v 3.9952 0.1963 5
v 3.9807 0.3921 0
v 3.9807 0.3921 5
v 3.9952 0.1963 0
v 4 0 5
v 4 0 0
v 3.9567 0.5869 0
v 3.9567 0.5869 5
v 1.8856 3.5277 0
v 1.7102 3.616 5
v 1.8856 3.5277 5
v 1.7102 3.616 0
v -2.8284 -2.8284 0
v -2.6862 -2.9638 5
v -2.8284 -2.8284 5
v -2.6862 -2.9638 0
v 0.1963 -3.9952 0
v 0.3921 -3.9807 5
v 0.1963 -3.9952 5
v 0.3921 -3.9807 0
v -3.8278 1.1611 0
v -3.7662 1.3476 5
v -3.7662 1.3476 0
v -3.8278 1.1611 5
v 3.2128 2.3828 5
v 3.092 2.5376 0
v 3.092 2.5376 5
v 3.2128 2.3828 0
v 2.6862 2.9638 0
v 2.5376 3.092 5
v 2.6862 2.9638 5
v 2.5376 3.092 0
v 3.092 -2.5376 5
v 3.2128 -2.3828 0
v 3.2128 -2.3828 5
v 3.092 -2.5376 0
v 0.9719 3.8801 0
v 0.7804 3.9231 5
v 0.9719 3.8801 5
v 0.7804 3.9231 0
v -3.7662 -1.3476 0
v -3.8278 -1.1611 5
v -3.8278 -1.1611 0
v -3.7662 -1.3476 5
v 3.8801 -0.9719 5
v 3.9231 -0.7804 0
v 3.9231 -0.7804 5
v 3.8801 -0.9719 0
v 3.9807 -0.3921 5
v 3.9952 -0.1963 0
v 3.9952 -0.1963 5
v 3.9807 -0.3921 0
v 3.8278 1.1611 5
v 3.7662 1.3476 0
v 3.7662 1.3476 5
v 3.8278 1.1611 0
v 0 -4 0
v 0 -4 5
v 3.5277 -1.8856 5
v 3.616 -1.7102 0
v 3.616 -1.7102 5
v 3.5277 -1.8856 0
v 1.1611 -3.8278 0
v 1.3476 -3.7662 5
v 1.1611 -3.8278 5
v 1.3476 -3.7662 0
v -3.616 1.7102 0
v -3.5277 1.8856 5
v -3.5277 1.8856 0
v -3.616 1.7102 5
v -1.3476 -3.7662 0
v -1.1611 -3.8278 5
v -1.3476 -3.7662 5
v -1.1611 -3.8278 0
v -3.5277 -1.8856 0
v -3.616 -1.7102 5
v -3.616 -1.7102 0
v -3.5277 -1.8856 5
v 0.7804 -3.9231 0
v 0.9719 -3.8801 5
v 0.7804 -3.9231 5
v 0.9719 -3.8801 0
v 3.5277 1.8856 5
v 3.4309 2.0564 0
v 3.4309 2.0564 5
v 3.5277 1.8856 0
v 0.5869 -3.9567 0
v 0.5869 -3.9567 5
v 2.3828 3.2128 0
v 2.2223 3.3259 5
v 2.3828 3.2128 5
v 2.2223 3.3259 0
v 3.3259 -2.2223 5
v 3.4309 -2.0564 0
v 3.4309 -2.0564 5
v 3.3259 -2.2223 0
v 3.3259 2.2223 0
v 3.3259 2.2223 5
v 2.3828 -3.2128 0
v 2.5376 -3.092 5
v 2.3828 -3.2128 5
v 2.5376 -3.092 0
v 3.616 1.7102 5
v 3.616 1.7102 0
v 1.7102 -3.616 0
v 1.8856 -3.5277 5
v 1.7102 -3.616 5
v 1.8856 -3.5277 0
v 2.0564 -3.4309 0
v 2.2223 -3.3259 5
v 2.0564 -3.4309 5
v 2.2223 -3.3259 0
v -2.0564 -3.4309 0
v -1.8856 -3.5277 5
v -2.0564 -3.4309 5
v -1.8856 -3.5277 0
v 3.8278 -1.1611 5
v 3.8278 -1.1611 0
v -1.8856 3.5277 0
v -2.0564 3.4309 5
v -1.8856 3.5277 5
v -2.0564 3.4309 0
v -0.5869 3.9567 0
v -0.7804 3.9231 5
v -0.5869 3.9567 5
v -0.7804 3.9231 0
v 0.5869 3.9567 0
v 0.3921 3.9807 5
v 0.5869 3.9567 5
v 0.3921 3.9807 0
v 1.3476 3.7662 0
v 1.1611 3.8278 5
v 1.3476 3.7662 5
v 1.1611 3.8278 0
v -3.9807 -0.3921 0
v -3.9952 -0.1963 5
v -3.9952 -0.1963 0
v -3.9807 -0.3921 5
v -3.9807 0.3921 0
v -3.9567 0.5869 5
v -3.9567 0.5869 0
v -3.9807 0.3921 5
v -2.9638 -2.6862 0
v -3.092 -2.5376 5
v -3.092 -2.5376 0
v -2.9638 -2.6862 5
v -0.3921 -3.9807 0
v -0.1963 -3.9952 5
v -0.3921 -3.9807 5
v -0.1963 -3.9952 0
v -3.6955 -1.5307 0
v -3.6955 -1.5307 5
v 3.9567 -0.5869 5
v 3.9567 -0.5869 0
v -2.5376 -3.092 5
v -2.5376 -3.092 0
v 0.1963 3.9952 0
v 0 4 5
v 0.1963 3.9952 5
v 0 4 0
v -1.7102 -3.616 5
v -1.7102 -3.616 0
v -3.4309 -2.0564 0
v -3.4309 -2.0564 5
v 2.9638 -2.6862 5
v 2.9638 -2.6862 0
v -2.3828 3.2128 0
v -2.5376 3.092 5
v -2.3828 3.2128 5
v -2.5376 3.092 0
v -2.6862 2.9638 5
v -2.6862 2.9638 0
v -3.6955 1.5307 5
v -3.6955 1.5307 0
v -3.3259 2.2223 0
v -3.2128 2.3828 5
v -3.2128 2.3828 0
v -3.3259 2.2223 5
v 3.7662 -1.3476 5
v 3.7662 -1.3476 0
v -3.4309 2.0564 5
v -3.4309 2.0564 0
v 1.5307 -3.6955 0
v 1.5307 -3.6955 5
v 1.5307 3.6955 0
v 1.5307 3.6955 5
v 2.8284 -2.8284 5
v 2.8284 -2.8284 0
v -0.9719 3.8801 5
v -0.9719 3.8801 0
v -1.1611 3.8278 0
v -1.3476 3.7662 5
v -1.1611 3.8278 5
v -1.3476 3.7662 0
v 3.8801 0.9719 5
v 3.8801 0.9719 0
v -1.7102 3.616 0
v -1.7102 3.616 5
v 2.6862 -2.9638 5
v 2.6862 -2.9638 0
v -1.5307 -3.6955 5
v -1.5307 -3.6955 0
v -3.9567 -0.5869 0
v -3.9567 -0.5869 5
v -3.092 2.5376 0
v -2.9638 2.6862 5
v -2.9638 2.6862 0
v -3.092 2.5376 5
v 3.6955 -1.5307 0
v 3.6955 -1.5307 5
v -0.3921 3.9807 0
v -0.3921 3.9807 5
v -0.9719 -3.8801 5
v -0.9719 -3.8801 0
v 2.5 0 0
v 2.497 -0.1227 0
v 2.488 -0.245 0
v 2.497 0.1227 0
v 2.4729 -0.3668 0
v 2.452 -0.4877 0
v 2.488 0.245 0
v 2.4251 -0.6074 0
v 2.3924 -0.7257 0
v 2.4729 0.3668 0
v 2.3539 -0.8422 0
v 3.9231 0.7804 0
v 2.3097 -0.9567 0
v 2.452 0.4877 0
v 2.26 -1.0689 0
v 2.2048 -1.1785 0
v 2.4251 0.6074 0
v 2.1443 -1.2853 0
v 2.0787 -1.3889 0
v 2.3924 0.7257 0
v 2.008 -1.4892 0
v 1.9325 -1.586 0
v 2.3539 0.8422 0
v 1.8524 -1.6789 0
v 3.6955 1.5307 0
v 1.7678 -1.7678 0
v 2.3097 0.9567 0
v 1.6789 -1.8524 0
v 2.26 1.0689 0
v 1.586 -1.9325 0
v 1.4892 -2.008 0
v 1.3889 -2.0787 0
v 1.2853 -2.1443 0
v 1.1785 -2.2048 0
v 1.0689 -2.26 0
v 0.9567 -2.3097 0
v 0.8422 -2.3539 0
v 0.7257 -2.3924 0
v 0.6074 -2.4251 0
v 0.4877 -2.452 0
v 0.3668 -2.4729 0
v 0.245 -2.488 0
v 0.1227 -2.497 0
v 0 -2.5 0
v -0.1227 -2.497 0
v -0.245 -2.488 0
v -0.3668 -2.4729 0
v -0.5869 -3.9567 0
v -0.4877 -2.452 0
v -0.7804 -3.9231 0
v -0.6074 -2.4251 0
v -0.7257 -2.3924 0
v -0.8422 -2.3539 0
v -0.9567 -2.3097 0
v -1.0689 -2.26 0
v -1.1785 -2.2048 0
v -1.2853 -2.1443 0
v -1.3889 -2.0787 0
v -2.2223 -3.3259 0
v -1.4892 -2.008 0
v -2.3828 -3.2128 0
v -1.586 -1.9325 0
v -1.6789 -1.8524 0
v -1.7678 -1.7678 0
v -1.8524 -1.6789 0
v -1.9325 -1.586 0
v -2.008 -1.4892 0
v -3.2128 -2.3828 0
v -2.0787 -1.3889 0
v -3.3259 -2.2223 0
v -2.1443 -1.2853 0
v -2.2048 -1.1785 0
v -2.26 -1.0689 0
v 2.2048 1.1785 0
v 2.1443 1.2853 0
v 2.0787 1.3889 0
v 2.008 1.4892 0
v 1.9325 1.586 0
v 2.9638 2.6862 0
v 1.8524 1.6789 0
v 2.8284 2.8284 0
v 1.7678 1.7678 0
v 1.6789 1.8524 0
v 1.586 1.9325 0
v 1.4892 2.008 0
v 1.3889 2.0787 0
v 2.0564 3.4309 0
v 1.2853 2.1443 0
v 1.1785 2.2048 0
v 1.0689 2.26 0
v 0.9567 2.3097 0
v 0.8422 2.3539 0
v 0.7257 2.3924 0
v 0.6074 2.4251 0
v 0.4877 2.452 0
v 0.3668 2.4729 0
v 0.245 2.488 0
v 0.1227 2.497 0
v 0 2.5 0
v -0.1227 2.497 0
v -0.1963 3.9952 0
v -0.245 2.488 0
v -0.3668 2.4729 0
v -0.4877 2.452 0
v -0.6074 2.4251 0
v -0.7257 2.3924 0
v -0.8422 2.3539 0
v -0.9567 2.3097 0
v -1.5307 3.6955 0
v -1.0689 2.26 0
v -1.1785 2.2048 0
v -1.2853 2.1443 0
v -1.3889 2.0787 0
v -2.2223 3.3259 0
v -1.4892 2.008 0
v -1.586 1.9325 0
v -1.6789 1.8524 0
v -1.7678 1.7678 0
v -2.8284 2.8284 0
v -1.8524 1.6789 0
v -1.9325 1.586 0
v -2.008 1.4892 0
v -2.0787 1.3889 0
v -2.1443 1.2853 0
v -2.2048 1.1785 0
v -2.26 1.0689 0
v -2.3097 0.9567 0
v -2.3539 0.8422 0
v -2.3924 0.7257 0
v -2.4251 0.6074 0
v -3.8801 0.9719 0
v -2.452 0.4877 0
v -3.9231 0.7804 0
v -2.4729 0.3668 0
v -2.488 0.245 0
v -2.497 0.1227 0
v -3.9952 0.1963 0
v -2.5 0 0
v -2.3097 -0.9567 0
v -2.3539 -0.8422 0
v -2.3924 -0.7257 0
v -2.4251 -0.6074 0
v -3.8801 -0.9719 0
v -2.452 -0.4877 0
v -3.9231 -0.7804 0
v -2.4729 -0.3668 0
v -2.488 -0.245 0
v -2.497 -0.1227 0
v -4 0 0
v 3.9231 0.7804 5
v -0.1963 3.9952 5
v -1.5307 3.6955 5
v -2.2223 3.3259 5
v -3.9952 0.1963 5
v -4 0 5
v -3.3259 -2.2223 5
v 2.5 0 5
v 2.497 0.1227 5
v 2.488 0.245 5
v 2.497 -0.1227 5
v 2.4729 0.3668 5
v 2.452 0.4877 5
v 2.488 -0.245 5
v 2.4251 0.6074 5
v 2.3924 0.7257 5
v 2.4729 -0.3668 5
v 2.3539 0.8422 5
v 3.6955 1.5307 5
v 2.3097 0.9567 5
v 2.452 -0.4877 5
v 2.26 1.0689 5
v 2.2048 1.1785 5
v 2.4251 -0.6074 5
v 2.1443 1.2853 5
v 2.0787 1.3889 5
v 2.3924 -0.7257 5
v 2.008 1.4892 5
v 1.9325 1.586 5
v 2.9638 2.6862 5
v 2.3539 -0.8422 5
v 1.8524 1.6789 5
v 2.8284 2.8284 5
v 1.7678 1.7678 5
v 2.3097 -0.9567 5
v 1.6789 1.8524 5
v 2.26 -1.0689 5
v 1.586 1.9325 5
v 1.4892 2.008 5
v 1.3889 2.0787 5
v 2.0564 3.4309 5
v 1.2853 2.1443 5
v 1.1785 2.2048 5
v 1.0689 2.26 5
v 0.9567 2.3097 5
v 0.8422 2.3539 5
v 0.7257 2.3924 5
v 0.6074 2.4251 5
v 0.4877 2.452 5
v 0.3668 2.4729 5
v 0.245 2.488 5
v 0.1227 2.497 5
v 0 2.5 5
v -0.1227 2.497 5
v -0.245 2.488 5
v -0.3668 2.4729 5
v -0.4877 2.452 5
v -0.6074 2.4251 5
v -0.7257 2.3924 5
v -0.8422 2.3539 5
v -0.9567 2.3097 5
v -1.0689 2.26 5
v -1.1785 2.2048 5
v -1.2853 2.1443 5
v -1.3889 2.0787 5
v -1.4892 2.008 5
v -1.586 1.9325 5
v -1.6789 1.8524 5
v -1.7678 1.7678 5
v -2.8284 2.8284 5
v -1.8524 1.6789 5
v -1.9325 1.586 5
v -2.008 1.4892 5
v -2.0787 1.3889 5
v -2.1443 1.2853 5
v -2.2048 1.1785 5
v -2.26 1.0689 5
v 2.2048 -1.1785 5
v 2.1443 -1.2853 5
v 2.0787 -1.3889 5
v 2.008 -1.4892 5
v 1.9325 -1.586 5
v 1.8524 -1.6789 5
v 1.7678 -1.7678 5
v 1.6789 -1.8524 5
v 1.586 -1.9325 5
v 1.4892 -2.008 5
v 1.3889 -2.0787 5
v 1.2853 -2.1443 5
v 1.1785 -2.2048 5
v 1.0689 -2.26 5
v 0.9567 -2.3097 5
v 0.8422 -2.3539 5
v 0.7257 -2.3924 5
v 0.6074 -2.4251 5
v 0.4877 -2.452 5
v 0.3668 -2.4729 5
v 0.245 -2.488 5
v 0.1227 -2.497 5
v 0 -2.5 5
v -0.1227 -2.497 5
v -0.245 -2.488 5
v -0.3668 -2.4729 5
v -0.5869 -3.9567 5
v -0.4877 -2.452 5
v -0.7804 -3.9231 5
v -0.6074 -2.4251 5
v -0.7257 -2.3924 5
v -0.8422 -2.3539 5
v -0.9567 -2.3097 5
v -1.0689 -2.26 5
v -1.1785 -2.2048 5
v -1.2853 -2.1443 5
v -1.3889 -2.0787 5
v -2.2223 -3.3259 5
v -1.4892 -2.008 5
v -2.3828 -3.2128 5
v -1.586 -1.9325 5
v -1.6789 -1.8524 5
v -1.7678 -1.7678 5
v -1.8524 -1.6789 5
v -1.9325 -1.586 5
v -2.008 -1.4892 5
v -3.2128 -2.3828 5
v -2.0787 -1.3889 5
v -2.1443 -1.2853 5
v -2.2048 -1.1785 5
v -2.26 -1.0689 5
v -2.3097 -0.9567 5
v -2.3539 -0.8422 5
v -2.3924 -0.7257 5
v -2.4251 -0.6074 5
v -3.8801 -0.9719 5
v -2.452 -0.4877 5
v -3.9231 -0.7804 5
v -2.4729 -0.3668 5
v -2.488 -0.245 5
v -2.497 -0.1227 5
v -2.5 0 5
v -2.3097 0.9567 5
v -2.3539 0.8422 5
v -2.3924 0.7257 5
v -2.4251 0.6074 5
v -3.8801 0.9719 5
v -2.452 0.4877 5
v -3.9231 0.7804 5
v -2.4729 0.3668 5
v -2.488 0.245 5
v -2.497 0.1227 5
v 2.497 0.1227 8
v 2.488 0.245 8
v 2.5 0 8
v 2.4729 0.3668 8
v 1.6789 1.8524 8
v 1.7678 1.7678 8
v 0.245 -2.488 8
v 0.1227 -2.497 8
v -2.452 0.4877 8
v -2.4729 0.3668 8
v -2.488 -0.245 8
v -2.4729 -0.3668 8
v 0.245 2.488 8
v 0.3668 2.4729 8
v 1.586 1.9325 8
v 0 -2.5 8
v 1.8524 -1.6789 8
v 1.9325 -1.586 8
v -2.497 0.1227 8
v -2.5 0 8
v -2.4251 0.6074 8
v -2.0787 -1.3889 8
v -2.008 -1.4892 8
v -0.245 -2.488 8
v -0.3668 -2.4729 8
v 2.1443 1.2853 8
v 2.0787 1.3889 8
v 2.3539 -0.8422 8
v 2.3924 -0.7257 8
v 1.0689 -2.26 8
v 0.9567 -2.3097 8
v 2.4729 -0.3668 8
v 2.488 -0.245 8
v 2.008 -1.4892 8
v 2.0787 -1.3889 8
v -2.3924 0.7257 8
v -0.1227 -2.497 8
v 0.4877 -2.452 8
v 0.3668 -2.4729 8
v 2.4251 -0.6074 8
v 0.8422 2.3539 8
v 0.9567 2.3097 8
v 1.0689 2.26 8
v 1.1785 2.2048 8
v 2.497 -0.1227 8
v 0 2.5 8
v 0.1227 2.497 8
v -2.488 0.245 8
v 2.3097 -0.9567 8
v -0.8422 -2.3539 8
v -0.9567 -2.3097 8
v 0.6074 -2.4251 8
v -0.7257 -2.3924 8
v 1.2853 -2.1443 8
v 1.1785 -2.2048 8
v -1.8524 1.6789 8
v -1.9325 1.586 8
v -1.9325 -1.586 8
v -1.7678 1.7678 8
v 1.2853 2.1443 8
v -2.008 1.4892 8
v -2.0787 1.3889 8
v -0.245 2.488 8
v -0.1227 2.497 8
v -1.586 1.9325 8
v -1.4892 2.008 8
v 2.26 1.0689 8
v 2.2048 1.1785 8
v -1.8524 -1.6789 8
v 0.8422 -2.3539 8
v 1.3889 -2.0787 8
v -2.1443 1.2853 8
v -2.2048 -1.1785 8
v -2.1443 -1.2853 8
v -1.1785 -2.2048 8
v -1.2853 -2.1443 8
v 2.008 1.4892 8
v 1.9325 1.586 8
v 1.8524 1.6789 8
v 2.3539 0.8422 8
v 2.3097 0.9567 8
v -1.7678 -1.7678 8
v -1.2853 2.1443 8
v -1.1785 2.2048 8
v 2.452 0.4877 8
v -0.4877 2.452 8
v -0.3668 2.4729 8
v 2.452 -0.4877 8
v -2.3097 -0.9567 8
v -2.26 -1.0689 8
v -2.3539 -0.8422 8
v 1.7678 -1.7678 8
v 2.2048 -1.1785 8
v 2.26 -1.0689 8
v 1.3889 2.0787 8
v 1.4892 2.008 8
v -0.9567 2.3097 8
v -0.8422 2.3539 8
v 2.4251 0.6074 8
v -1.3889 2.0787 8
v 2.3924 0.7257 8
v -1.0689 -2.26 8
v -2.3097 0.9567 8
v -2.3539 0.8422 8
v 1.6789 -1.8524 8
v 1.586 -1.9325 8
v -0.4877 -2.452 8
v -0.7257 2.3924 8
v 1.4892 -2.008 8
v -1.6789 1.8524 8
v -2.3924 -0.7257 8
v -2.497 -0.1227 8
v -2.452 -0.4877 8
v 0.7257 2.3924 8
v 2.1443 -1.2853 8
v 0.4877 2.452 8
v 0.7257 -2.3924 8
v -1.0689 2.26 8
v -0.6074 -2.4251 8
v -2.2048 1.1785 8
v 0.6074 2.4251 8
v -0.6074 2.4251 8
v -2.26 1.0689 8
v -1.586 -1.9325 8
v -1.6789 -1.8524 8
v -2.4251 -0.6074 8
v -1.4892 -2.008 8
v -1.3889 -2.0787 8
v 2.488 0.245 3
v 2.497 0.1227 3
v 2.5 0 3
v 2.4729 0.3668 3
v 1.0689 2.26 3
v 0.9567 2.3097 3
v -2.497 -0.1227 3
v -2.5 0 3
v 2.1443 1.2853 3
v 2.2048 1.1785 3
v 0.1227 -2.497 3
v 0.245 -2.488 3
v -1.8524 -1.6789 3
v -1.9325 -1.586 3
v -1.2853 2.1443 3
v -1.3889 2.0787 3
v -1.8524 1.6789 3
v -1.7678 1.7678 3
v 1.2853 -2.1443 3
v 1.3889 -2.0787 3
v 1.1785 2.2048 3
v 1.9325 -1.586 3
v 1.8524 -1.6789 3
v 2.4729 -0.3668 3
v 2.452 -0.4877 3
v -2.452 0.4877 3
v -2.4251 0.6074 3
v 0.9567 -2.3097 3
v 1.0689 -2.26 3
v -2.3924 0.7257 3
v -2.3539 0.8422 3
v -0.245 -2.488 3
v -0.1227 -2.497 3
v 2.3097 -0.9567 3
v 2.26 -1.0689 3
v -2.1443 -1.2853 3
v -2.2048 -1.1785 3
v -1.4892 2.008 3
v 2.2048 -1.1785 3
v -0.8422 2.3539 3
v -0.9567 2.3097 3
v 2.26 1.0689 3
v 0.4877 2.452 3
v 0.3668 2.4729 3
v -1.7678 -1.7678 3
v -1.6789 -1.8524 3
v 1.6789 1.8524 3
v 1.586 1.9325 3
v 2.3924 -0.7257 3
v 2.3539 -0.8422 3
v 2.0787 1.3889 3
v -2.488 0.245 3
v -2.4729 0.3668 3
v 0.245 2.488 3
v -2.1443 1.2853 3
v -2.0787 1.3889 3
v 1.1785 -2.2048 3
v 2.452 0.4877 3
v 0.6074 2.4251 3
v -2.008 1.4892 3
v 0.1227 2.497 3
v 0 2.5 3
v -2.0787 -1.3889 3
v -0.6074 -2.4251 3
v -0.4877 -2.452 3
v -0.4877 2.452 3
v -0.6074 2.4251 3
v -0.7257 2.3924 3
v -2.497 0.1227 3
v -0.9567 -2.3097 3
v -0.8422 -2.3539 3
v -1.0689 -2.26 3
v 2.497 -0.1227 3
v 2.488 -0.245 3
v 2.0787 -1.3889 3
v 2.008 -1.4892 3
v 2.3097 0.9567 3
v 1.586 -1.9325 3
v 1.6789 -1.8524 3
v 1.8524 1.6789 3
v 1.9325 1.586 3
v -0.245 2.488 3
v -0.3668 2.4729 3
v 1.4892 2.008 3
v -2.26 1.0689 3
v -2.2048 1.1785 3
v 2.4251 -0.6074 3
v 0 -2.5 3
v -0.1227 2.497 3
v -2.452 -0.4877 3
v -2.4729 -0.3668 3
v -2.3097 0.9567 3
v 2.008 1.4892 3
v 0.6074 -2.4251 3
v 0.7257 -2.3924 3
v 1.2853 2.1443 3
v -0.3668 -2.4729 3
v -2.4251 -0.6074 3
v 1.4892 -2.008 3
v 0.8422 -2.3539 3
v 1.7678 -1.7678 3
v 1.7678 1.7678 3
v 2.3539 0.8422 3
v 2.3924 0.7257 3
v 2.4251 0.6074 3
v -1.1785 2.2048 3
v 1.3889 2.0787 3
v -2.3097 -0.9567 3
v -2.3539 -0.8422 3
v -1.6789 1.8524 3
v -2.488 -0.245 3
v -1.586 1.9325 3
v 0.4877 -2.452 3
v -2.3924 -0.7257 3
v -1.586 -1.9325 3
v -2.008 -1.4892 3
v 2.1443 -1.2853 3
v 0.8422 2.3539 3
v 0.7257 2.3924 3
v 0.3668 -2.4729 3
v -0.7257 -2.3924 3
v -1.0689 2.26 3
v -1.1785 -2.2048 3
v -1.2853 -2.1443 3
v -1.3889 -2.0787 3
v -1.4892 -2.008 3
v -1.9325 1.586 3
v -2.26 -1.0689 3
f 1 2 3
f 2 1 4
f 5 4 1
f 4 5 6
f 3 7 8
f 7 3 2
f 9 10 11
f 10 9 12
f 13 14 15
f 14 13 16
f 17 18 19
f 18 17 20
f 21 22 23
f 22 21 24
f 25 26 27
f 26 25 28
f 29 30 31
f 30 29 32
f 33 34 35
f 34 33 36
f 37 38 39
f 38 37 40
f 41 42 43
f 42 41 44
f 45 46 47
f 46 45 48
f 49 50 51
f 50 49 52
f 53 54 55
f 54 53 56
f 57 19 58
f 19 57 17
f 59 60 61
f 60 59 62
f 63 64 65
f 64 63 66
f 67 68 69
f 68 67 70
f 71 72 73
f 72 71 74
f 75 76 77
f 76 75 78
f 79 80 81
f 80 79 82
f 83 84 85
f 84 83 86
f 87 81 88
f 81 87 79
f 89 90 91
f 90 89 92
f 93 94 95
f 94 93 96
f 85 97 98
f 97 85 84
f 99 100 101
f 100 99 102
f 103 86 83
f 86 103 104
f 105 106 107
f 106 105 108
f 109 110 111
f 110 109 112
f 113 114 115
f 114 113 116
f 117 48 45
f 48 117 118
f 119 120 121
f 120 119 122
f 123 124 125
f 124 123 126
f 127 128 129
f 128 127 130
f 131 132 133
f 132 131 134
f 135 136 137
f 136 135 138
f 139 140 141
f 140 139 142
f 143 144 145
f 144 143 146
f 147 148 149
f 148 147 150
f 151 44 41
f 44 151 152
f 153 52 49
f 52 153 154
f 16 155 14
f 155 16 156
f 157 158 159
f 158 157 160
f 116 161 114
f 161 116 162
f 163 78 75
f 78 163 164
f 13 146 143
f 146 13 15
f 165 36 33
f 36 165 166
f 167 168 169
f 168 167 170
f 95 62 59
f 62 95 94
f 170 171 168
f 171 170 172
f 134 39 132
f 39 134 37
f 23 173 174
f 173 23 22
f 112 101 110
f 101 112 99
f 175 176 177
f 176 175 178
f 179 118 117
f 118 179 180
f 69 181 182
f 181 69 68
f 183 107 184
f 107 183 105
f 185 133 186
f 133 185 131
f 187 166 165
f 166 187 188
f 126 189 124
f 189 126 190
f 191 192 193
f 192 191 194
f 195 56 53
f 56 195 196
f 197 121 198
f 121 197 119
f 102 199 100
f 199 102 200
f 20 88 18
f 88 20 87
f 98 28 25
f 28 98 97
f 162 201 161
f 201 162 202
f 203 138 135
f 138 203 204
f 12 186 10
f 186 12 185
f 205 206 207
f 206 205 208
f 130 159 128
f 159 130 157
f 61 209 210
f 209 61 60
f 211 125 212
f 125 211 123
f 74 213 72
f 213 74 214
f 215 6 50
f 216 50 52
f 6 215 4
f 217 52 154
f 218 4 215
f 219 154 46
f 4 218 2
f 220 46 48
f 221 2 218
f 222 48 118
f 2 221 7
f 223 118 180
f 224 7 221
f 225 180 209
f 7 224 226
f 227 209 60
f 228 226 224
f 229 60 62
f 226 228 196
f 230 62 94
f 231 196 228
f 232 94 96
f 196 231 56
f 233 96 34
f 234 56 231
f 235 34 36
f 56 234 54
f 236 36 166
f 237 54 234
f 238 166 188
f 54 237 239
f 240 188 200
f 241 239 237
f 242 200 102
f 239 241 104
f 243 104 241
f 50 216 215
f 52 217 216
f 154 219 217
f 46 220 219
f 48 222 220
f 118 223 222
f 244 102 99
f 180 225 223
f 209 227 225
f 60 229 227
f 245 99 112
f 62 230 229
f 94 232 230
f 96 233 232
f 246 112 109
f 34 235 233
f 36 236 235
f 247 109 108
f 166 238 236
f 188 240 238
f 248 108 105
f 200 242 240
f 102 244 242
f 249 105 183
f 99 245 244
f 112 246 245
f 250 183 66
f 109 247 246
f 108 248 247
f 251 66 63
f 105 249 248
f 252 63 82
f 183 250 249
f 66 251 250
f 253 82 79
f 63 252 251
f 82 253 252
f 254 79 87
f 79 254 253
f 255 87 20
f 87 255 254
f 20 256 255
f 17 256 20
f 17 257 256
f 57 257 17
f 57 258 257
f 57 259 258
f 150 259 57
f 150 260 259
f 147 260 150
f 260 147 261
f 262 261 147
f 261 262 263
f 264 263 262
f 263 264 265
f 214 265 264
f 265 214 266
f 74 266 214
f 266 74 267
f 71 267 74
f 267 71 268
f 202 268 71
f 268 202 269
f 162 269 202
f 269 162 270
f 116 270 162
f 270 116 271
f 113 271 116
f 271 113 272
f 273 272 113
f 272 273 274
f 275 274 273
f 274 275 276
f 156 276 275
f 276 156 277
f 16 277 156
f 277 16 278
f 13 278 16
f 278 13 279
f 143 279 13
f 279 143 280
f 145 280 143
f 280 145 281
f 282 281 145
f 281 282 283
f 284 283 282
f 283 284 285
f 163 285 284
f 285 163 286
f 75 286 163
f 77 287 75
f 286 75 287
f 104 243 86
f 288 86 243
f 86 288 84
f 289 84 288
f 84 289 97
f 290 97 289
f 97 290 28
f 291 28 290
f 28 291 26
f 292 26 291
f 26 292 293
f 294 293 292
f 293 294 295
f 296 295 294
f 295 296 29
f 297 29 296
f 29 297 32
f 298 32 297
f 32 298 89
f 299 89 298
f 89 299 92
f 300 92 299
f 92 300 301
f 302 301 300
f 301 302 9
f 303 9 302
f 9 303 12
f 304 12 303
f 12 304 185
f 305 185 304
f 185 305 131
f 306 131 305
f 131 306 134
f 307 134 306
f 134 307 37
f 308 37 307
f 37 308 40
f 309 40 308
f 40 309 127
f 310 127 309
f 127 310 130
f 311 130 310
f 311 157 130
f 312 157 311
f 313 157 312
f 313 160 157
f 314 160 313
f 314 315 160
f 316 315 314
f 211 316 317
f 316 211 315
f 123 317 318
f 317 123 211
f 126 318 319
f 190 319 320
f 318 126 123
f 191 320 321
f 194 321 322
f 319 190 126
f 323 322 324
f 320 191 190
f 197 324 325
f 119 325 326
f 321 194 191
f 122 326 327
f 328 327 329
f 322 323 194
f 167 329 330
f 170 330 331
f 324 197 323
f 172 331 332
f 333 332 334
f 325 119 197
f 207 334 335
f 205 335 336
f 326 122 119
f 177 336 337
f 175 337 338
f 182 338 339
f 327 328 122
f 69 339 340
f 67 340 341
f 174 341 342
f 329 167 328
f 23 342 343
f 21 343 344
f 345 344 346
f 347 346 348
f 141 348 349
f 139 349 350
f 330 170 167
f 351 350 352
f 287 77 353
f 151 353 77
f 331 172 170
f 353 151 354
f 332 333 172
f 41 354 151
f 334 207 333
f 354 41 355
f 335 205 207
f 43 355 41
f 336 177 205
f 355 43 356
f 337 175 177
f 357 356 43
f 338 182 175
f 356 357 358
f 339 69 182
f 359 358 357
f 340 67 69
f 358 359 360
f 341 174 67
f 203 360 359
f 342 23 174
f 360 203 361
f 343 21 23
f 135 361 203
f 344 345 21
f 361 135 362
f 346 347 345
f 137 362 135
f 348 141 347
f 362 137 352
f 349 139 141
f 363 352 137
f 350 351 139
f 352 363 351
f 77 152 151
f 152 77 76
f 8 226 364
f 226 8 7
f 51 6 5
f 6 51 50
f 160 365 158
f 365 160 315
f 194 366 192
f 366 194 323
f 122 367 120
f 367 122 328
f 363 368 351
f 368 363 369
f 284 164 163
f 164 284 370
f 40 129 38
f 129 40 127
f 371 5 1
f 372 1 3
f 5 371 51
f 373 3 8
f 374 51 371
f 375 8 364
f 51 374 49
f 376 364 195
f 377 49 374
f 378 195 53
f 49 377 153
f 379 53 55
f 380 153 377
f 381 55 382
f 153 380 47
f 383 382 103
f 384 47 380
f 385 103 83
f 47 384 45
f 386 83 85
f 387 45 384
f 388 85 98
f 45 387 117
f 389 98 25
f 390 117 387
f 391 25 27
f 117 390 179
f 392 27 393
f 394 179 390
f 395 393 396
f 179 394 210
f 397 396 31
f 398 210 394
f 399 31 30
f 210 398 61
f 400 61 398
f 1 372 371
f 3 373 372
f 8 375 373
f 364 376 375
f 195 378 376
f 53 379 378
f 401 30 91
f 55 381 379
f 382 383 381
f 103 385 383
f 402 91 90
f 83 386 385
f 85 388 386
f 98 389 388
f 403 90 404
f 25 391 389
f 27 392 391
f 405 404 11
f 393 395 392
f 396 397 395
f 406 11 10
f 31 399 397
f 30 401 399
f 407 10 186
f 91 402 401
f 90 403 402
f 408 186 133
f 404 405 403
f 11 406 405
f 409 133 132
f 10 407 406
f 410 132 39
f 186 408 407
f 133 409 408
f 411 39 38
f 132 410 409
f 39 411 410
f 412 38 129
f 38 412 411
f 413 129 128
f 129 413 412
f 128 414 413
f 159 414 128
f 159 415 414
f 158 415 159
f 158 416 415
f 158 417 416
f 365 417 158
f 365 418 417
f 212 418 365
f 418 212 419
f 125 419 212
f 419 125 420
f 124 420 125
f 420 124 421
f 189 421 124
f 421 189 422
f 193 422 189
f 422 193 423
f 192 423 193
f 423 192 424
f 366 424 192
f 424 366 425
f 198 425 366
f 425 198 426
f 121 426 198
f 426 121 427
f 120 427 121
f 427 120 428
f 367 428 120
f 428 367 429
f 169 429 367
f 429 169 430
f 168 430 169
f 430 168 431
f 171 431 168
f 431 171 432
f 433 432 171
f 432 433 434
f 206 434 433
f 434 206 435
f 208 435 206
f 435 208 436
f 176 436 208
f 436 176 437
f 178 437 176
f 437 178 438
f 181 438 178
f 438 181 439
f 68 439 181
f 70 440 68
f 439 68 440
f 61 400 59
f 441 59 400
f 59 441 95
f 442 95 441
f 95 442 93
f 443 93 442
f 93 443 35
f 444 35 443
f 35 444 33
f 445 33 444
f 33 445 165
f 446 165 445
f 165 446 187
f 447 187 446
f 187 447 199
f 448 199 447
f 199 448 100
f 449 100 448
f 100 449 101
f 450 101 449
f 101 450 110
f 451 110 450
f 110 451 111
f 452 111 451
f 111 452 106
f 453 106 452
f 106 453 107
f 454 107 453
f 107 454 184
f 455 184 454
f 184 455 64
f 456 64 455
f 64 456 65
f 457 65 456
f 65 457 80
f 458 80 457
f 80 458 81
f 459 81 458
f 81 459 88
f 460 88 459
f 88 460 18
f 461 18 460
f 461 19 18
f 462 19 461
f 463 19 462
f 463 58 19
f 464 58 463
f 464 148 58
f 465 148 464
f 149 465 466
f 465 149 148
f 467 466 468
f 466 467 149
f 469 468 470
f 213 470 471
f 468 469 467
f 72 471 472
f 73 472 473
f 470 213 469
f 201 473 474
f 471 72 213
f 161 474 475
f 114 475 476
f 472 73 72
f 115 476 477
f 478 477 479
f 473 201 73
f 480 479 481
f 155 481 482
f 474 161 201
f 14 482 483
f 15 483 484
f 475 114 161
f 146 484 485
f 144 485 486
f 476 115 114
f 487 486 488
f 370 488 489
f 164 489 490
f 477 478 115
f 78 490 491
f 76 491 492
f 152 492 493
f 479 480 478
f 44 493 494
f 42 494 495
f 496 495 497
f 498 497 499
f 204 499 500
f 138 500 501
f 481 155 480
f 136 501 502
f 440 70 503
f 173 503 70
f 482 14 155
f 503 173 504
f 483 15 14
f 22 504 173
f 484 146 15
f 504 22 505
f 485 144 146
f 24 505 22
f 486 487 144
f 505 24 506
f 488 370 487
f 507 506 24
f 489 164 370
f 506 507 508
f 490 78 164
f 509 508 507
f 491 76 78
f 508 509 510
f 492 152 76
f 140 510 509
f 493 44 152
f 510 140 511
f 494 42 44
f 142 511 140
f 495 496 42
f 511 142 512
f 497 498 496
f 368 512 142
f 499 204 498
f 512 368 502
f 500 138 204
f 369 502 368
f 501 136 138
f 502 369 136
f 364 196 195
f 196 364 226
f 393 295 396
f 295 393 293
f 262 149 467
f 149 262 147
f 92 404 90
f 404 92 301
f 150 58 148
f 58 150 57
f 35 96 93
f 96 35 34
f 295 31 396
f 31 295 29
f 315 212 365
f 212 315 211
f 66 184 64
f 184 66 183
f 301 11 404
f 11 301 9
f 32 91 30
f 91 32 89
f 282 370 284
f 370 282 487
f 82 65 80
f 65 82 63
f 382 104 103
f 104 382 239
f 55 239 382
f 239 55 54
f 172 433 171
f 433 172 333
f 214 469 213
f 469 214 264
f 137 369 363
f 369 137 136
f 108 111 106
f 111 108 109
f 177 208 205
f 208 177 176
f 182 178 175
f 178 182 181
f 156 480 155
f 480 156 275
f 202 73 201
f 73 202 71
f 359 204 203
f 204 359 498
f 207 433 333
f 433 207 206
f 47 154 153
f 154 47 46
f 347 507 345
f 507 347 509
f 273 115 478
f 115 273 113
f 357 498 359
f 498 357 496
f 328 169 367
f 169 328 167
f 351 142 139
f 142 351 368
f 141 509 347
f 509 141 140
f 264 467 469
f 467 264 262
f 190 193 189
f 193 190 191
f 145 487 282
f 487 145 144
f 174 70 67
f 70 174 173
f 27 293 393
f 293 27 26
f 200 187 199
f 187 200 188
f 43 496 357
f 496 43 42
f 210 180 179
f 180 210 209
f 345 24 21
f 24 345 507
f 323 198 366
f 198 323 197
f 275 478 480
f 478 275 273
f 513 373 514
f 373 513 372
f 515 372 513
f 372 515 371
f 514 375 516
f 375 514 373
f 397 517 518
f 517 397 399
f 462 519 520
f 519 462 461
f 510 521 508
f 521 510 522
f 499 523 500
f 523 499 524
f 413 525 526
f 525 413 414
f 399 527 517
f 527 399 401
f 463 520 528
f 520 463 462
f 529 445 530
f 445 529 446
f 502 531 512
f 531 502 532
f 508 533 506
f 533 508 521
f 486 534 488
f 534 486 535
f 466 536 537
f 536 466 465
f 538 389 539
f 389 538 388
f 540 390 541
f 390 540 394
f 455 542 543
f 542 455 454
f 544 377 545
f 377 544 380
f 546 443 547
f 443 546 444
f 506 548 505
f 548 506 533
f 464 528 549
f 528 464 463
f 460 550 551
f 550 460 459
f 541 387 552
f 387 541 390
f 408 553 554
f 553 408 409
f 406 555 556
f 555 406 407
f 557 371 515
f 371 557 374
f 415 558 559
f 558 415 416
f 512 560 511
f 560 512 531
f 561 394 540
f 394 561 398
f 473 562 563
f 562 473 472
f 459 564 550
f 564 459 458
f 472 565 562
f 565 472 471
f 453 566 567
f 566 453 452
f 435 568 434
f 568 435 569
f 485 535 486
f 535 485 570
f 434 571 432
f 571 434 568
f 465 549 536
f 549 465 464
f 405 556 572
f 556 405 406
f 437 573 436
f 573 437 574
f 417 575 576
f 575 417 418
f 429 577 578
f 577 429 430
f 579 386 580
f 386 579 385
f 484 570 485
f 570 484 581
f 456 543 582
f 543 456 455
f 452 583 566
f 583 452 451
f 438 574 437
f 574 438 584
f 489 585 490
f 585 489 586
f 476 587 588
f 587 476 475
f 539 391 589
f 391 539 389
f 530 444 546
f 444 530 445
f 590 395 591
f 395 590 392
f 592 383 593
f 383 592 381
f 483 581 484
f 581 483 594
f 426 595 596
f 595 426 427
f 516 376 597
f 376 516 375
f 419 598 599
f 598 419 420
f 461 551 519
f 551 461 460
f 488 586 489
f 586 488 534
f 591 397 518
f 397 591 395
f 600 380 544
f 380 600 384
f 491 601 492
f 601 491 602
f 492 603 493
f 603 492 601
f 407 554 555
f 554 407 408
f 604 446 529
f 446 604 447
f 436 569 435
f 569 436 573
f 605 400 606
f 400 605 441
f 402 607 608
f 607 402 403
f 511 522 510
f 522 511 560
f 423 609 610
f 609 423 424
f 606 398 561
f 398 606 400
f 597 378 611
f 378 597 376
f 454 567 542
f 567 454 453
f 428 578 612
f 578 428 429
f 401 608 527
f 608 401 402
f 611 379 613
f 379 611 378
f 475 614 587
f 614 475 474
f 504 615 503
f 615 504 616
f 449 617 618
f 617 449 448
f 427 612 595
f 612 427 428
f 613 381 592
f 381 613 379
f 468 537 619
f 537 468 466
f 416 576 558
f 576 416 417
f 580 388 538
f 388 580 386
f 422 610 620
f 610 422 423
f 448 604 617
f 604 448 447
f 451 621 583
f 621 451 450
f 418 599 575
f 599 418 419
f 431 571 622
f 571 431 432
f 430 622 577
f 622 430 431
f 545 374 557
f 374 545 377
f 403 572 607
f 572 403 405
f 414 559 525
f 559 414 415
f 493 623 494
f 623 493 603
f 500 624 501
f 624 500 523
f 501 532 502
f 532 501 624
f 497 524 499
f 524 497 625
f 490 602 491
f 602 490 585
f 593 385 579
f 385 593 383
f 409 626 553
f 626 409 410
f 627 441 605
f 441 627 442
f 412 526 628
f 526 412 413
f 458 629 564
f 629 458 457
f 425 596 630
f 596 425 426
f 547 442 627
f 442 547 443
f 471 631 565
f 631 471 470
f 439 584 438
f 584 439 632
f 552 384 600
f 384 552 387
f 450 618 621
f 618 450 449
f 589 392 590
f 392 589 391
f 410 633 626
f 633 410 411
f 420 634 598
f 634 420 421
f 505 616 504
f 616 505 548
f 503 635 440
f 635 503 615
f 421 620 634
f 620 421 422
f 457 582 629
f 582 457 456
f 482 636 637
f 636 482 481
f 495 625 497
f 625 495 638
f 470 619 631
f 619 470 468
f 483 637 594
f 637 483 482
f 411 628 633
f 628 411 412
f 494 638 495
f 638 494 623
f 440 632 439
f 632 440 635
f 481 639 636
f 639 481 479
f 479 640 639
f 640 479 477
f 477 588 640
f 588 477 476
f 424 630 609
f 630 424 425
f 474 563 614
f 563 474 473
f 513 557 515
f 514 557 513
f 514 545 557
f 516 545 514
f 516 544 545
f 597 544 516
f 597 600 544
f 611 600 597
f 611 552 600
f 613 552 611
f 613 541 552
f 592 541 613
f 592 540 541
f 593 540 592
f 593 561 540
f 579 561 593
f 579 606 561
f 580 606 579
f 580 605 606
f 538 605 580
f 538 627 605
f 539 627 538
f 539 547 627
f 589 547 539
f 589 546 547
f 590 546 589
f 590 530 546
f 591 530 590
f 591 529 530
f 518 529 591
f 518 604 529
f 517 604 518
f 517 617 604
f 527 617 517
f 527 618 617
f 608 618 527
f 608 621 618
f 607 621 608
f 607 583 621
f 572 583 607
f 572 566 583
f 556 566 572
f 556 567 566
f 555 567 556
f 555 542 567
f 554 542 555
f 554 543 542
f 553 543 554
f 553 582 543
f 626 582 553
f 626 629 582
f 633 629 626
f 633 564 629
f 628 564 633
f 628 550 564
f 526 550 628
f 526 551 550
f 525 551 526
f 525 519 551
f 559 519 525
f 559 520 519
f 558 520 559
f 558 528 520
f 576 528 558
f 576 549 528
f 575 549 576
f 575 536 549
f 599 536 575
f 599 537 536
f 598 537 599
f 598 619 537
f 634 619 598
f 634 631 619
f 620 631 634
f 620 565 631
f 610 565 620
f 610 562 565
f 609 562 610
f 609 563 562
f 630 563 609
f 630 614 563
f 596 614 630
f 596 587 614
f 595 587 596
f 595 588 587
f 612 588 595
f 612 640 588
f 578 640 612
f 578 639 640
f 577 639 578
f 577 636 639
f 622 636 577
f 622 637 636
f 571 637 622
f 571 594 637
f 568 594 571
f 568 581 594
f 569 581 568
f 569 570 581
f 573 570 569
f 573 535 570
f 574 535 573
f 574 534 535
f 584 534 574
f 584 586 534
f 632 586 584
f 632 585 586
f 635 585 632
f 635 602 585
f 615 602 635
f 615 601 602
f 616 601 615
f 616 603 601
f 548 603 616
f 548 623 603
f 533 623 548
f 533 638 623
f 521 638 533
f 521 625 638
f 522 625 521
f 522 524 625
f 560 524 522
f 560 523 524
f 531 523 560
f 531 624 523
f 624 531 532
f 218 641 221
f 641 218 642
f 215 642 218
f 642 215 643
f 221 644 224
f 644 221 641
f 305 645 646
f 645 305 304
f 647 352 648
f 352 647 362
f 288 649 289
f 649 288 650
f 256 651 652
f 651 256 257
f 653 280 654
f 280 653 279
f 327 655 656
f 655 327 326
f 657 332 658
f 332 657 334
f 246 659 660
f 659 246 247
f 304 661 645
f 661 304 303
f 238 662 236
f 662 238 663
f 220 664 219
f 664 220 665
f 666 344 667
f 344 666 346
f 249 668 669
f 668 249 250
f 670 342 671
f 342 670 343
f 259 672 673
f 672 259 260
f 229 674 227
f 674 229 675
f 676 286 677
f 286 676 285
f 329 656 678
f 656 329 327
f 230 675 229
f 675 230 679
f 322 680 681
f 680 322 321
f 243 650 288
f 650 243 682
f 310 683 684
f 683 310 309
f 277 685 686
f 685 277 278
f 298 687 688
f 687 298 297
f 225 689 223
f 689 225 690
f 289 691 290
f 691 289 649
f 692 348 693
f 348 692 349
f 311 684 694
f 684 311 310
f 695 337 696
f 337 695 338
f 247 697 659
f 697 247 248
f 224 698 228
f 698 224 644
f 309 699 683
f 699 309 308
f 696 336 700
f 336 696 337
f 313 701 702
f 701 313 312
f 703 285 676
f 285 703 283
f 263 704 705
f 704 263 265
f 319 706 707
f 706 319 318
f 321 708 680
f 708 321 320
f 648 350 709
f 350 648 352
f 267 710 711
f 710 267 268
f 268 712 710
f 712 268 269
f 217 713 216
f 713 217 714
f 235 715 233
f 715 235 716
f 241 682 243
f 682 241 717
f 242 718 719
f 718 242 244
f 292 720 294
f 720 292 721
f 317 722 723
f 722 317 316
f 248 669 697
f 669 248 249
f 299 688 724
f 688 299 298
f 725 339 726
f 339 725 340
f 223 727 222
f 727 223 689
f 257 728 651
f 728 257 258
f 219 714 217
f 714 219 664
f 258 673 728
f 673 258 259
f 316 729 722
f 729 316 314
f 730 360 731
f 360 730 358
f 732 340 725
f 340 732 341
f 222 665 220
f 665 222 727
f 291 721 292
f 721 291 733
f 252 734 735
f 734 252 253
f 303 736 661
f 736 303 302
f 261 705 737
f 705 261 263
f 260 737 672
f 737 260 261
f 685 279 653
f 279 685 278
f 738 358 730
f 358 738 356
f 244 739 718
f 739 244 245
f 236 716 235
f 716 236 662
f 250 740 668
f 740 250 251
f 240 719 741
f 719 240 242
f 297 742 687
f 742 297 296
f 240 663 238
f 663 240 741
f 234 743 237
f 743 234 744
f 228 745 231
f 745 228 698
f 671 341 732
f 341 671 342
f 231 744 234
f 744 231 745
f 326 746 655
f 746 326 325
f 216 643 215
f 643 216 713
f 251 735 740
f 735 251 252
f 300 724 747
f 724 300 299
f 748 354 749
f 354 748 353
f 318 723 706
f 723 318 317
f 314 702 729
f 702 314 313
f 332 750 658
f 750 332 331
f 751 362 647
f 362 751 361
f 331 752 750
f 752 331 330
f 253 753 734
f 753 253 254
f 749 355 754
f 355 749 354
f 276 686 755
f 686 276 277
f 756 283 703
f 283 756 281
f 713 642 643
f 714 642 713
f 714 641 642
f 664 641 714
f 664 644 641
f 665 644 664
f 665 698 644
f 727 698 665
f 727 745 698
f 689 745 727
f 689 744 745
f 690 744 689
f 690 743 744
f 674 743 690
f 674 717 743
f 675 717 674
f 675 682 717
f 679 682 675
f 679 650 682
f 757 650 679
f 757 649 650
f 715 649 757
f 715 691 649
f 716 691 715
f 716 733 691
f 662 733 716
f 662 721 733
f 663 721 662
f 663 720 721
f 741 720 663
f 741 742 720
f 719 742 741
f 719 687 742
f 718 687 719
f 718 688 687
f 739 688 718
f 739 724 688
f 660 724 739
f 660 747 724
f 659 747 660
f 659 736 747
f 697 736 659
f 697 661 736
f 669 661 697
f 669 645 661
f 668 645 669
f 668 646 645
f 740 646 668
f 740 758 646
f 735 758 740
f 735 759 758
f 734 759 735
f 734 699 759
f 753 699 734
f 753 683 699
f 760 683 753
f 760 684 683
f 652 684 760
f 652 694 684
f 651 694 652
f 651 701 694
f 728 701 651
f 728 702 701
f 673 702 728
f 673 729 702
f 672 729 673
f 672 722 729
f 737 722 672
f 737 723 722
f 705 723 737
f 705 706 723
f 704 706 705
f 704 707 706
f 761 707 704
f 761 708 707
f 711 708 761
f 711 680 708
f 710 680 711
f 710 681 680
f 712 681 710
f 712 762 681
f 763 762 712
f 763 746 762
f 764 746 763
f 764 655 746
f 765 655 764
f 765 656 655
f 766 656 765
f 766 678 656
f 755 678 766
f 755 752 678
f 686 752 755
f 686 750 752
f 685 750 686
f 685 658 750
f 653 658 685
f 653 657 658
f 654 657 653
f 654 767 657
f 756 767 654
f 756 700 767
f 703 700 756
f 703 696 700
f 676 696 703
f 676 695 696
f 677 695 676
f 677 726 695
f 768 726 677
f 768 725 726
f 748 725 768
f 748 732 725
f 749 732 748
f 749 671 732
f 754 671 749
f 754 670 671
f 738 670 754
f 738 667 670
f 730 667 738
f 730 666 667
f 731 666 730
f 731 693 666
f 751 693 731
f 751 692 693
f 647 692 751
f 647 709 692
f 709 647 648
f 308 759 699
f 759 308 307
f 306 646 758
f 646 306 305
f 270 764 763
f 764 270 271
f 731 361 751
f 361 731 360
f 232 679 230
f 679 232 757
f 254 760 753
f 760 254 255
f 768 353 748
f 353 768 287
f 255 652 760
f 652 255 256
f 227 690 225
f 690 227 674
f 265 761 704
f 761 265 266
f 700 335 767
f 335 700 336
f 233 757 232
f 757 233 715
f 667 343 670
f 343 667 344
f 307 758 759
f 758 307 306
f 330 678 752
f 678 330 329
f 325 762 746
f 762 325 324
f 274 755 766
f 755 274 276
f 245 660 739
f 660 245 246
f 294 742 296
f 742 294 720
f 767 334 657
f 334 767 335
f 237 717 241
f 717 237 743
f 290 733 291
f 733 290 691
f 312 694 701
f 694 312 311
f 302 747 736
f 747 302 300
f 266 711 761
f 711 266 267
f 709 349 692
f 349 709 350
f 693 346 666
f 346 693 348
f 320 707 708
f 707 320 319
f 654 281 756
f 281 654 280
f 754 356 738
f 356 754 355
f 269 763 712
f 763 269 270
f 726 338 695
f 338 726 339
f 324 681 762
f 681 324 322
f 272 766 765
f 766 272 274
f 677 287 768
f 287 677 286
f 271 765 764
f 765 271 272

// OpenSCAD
// Units: mm. Round fit prototype, NOT a model of the SG90 spline teeth.
// The male projection of 3 mm is assumed to match the requested socket depth.
$fn=128;
body_length=5;
body_diameter=8;
male_diameter=5;
male_length=3;
female_diameter=5;
female_depth=3;
difference() {
    union() {
        cylinder(h=body_length,d=body_diameter);
        translate([0,0,body_length]) cylinder(h=male_length,d=male_diameter);
    }
    translate([0,0,-0.01]) cylinder(h=female_depth+0.01,d=female_diameter);
}
